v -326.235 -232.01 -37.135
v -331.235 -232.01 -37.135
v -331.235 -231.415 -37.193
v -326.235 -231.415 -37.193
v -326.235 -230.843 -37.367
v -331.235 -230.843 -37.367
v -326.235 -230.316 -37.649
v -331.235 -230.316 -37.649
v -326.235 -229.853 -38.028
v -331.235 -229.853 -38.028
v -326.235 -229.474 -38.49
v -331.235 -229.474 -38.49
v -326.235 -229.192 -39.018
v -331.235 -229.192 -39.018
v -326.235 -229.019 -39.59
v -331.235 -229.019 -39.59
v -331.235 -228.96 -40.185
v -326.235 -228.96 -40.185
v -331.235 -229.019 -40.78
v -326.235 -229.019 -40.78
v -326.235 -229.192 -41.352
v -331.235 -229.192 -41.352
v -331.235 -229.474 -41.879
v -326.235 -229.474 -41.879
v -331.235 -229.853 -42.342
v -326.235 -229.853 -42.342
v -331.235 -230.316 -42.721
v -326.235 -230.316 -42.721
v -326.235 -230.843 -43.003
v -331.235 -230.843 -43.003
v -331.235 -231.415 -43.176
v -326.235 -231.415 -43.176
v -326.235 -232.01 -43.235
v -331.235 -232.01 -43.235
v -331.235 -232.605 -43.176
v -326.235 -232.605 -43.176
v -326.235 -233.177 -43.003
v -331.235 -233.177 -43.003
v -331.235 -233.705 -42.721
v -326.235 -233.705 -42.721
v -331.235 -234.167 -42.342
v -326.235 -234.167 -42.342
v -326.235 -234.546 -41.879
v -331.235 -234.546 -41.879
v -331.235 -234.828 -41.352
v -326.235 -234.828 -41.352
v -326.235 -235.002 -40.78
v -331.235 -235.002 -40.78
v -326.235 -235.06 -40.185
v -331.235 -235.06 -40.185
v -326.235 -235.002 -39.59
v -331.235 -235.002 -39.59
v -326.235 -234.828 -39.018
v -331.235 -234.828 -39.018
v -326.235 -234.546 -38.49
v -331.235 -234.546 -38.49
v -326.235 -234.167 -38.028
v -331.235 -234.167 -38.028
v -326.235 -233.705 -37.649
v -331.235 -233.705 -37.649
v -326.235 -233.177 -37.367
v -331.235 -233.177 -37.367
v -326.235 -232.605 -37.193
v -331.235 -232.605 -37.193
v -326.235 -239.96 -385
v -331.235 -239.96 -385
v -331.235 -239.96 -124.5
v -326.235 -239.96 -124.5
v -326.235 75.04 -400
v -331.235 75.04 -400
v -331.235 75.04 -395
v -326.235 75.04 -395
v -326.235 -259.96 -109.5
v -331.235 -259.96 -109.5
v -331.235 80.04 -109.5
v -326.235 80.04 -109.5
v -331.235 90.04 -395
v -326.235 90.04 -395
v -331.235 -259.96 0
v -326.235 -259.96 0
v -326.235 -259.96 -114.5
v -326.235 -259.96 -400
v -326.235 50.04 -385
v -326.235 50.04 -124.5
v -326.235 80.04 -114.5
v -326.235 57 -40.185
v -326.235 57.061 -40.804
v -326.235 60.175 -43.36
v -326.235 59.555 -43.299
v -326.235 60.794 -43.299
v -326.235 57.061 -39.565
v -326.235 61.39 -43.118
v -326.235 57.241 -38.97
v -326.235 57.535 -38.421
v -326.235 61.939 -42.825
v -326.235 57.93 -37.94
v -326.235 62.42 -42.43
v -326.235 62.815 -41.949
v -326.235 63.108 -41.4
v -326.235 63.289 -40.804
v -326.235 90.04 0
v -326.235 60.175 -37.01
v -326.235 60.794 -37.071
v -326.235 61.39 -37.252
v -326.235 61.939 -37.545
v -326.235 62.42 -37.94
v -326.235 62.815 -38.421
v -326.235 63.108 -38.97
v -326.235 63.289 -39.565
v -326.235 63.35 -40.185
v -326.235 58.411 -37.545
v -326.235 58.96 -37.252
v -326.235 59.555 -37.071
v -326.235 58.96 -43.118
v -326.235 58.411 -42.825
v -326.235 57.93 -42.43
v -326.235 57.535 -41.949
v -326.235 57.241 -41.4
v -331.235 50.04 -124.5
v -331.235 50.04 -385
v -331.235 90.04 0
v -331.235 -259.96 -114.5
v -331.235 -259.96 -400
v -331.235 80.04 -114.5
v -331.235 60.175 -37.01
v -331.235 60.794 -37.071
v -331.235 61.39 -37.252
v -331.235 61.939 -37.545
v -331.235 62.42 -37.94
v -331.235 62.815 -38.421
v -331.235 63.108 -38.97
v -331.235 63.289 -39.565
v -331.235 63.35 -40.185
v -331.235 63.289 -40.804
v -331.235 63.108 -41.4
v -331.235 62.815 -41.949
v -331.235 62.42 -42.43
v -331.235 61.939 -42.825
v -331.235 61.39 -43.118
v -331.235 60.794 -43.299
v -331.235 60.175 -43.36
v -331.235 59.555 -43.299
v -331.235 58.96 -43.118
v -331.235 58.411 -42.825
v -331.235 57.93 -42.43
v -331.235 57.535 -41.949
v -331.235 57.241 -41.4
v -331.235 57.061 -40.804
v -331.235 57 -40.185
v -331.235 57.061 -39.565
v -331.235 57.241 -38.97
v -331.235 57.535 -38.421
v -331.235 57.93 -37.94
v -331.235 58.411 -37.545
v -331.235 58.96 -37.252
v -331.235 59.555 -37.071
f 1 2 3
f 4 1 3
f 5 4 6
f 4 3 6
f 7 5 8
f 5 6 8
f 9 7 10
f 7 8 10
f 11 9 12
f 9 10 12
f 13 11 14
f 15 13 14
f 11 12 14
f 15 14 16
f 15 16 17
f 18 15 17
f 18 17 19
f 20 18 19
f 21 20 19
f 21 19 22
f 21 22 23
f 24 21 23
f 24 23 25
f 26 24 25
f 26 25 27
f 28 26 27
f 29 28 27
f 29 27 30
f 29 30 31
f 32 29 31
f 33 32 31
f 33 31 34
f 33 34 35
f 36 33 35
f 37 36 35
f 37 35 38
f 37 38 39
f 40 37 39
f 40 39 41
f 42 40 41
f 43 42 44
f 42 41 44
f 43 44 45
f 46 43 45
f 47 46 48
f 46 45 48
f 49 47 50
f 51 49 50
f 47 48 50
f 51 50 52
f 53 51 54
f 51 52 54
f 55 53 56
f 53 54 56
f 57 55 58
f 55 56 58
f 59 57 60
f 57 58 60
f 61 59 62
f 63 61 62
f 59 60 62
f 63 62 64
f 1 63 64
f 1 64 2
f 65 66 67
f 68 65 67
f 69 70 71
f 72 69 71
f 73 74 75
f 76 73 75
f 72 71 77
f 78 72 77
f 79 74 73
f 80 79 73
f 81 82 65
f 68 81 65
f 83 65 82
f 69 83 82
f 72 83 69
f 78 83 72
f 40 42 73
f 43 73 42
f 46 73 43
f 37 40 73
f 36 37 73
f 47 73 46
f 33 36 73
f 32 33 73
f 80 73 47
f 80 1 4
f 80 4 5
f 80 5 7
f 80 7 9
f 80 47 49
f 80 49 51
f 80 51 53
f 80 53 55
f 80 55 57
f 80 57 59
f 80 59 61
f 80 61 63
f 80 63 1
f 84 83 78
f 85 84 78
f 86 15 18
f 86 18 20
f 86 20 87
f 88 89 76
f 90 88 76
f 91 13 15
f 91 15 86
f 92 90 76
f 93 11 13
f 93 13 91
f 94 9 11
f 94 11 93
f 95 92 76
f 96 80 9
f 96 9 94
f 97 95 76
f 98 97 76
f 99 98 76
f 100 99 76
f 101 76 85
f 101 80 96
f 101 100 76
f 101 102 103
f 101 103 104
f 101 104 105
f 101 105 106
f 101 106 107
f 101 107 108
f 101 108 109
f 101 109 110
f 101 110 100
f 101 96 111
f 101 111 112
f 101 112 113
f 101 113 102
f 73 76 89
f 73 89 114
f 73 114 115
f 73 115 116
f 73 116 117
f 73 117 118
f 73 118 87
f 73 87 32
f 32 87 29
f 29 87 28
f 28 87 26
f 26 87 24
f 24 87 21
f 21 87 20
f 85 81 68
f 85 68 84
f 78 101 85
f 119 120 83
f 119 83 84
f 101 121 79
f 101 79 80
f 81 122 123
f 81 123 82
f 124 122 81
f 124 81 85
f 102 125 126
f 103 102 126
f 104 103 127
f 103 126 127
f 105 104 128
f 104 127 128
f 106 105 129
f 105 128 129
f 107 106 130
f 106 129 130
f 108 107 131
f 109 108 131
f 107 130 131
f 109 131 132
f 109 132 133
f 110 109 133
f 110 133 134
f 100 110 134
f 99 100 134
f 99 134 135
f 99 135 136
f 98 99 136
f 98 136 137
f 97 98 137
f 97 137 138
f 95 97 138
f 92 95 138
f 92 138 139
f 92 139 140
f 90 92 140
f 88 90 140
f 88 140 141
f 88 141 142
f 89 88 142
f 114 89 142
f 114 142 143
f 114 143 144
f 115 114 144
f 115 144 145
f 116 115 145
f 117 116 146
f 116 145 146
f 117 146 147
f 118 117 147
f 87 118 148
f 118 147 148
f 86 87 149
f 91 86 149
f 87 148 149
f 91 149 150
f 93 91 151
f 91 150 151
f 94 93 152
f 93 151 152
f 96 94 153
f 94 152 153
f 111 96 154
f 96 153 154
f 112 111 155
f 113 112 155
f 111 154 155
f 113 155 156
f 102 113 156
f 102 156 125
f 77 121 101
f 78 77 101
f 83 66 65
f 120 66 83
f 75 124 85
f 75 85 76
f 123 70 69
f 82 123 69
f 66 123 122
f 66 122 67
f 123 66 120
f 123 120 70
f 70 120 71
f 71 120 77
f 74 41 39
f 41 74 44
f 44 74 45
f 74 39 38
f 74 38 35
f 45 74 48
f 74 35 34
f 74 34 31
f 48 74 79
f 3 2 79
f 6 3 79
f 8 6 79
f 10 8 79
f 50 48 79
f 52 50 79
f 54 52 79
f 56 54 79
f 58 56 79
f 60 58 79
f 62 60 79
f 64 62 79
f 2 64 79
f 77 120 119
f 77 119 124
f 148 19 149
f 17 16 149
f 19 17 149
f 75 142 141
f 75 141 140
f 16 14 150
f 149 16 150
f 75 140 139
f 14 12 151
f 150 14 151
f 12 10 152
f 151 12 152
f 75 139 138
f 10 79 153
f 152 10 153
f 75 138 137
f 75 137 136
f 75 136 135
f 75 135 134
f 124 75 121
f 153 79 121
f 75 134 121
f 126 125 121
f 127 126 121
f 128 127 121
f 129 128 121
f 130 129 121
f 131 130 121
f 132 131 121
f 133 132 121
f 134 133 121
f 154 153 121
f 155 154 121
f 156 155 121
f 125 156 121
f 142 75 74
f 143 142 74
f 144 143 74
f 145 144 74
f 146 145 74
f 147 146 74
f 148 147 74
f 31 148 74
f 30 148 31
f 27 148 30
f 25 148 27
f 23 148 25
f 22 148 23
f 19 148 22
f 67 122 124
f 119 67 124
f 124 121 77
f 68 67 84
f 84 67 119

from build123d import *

# Parameters (mm, degrees)
CROQUIS1_W              = 5
CROQUIS1_H              = 350
SALIENTE_EXTRUIR1_DEPTH = 400
CROQUIS2_W              = 5
CROQUIS2_H              = 340
CROQUIS2_W_2            = 260.5
CROQUIS2_H_2            = 290
CROQUIS2_H_3            = 15
CORTAR_EXTRUIR1_DEPTH   = 30
CROQUIS3_R              = 3.175
CROQUIS3_R_2            = 3.05
CORTAR_EXTRUIR2_DEPTH   = 10


with BuildPart() as part:
    # Croquis1 → Saliente-Extruir1 (new body)
    with BuildSketch(Plane.XY):
        with Locations((-328.734660689, -84.960159363)):
            Rectangle(CROQUIS1_W, CROQUIS1_H)
    extrude(amount=-SALIENTE_EXTRUIR1_DEPTH)

    # Croquis2 → Cortar-Extruir1 (cut)
    with BuildSketch(Plane.ZY.offset(331.234660689)):
        with Locations((-112, -89.960159363)):
            Rectangle(CROQUIS2_W, CROQUIS2_H)
        with Locations((-254.75, -94.960159363)):
            Rectangle(CROQUIS2_W_2, CROQUIS2_H_2)
        with Locations((-397.5, 82.539840637)):
            Rectangle(CROQUIS2_W, CROQUIS2_H_3)
    extrude(amount=-CORTAR_EXTRUIR1_DEPTH, mode=Mode.SUBTRACT)

    # Croquis3 → Cortar-Extruir2 (cut)
    with BuildSketch(Plane.ZY.offset(331.234660689)):
        with Locations((-40.18483097, 60.17469511)):
            Circle(CROQUIS3_R)
        with Locations((-40.18483097, -232.010159363)):
            Circle(CROQUIS3_R_2)
    extrude(amount=-CORTAR_EXTRUIR2_DEPTH, mode=Mode.SUBTRACT)


solid = part.part
